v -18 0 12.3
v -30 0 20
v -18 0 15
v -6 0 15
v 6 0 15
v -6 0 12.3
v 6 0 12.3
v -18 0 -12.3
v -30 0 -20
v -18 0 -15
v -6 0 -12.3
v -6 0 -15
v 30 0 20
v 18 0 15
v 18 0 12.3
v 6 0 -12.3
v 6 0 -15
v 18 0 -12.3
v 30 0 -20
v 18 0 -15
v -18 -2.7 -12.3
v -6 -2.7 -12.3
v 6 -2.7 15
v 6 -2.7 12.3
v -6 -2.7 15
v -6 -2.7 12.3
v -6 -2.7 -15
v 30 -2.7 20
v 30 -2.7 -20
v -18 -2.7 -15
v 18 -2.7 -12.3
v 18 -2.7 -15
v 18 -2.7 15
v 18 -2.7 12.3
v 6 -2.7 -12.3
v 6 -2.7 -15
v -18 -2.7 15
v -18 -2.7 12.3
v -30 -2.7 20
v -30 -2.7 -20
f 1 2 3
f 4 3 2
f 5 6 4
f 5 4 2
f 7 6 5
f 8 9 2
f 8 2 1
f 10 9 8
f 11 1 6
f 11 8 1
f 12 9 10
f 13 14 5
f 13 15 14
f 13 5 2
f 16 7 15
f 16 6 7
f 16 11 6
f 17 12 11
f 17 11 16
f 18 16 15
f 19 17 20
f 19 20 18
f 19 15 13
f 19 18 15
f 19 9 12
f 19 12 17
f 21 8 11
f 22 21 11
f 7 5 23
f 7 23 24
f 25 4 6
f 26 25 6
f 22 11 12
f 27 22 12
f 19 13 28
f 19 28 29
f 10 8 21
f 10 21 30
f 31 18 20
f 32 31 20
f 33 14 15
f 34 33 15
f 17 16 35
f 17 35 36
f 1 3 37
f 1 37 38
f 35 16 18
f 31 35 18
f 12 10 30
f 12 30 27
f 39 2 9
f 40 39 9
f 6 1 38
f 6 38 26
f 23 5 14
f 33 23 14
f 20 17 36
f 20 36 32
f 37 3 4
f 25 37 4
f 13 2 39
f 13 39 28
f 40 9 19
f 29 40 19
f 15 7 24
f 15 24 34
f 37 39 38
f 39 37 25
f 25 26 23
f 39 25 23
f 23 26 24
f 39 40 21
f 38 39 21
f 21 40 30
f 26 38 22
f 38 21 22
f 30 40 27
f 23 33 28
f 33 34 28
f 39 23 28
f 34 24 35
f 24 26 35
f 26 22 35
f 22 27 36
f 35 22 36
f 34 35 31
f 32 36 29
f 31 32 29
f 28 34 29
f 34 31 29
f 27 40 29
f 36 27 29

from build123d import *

# Parameters (mm, degrees)
SKETCH1_W           = 60
SKETCH1_H           = 40
SKETCH1_W_2         = 12
SKETCH1_H_2         = 2.7
BOSS_EXTRUDE1_DEPTH = 2.7


with BuildPart() as part:
    # Sketch1 → Boss-Extrude1 (new body)
    with BuildSketch(Plane(origin=(0, 0, 0), x_dir=(1, 0, 0), z_dir=(0, 1, 0))):
        Rectangle(SKETCH1_W, SKETCH1_H)
        with Locations((-12, 13.65)):
            Rectangle(SKETCH1_W_2, SKETCH1_H_2, mode=Mode.SUBTRACT)
        with Locations((12, 13.65)):
            Rectangle(SKETCH1_W_2, SKETCH1_H_2, mode=Mode.SUBTRACT)
        with Locations((12, -13.65)):
            Rectangle(SKETCH1_W_2, SKETCH1_H_2, mode=Mode.SUBTRACT)
        with Locations((-12, -13.65)):
            Rectangle(SKETCH1_W_2, SKETCH1_H_2, mode=Mode.SUBTRACT)
    extrude(amount=-BOSS_EXTRUDE1_DEPTH)


solid = part.part
